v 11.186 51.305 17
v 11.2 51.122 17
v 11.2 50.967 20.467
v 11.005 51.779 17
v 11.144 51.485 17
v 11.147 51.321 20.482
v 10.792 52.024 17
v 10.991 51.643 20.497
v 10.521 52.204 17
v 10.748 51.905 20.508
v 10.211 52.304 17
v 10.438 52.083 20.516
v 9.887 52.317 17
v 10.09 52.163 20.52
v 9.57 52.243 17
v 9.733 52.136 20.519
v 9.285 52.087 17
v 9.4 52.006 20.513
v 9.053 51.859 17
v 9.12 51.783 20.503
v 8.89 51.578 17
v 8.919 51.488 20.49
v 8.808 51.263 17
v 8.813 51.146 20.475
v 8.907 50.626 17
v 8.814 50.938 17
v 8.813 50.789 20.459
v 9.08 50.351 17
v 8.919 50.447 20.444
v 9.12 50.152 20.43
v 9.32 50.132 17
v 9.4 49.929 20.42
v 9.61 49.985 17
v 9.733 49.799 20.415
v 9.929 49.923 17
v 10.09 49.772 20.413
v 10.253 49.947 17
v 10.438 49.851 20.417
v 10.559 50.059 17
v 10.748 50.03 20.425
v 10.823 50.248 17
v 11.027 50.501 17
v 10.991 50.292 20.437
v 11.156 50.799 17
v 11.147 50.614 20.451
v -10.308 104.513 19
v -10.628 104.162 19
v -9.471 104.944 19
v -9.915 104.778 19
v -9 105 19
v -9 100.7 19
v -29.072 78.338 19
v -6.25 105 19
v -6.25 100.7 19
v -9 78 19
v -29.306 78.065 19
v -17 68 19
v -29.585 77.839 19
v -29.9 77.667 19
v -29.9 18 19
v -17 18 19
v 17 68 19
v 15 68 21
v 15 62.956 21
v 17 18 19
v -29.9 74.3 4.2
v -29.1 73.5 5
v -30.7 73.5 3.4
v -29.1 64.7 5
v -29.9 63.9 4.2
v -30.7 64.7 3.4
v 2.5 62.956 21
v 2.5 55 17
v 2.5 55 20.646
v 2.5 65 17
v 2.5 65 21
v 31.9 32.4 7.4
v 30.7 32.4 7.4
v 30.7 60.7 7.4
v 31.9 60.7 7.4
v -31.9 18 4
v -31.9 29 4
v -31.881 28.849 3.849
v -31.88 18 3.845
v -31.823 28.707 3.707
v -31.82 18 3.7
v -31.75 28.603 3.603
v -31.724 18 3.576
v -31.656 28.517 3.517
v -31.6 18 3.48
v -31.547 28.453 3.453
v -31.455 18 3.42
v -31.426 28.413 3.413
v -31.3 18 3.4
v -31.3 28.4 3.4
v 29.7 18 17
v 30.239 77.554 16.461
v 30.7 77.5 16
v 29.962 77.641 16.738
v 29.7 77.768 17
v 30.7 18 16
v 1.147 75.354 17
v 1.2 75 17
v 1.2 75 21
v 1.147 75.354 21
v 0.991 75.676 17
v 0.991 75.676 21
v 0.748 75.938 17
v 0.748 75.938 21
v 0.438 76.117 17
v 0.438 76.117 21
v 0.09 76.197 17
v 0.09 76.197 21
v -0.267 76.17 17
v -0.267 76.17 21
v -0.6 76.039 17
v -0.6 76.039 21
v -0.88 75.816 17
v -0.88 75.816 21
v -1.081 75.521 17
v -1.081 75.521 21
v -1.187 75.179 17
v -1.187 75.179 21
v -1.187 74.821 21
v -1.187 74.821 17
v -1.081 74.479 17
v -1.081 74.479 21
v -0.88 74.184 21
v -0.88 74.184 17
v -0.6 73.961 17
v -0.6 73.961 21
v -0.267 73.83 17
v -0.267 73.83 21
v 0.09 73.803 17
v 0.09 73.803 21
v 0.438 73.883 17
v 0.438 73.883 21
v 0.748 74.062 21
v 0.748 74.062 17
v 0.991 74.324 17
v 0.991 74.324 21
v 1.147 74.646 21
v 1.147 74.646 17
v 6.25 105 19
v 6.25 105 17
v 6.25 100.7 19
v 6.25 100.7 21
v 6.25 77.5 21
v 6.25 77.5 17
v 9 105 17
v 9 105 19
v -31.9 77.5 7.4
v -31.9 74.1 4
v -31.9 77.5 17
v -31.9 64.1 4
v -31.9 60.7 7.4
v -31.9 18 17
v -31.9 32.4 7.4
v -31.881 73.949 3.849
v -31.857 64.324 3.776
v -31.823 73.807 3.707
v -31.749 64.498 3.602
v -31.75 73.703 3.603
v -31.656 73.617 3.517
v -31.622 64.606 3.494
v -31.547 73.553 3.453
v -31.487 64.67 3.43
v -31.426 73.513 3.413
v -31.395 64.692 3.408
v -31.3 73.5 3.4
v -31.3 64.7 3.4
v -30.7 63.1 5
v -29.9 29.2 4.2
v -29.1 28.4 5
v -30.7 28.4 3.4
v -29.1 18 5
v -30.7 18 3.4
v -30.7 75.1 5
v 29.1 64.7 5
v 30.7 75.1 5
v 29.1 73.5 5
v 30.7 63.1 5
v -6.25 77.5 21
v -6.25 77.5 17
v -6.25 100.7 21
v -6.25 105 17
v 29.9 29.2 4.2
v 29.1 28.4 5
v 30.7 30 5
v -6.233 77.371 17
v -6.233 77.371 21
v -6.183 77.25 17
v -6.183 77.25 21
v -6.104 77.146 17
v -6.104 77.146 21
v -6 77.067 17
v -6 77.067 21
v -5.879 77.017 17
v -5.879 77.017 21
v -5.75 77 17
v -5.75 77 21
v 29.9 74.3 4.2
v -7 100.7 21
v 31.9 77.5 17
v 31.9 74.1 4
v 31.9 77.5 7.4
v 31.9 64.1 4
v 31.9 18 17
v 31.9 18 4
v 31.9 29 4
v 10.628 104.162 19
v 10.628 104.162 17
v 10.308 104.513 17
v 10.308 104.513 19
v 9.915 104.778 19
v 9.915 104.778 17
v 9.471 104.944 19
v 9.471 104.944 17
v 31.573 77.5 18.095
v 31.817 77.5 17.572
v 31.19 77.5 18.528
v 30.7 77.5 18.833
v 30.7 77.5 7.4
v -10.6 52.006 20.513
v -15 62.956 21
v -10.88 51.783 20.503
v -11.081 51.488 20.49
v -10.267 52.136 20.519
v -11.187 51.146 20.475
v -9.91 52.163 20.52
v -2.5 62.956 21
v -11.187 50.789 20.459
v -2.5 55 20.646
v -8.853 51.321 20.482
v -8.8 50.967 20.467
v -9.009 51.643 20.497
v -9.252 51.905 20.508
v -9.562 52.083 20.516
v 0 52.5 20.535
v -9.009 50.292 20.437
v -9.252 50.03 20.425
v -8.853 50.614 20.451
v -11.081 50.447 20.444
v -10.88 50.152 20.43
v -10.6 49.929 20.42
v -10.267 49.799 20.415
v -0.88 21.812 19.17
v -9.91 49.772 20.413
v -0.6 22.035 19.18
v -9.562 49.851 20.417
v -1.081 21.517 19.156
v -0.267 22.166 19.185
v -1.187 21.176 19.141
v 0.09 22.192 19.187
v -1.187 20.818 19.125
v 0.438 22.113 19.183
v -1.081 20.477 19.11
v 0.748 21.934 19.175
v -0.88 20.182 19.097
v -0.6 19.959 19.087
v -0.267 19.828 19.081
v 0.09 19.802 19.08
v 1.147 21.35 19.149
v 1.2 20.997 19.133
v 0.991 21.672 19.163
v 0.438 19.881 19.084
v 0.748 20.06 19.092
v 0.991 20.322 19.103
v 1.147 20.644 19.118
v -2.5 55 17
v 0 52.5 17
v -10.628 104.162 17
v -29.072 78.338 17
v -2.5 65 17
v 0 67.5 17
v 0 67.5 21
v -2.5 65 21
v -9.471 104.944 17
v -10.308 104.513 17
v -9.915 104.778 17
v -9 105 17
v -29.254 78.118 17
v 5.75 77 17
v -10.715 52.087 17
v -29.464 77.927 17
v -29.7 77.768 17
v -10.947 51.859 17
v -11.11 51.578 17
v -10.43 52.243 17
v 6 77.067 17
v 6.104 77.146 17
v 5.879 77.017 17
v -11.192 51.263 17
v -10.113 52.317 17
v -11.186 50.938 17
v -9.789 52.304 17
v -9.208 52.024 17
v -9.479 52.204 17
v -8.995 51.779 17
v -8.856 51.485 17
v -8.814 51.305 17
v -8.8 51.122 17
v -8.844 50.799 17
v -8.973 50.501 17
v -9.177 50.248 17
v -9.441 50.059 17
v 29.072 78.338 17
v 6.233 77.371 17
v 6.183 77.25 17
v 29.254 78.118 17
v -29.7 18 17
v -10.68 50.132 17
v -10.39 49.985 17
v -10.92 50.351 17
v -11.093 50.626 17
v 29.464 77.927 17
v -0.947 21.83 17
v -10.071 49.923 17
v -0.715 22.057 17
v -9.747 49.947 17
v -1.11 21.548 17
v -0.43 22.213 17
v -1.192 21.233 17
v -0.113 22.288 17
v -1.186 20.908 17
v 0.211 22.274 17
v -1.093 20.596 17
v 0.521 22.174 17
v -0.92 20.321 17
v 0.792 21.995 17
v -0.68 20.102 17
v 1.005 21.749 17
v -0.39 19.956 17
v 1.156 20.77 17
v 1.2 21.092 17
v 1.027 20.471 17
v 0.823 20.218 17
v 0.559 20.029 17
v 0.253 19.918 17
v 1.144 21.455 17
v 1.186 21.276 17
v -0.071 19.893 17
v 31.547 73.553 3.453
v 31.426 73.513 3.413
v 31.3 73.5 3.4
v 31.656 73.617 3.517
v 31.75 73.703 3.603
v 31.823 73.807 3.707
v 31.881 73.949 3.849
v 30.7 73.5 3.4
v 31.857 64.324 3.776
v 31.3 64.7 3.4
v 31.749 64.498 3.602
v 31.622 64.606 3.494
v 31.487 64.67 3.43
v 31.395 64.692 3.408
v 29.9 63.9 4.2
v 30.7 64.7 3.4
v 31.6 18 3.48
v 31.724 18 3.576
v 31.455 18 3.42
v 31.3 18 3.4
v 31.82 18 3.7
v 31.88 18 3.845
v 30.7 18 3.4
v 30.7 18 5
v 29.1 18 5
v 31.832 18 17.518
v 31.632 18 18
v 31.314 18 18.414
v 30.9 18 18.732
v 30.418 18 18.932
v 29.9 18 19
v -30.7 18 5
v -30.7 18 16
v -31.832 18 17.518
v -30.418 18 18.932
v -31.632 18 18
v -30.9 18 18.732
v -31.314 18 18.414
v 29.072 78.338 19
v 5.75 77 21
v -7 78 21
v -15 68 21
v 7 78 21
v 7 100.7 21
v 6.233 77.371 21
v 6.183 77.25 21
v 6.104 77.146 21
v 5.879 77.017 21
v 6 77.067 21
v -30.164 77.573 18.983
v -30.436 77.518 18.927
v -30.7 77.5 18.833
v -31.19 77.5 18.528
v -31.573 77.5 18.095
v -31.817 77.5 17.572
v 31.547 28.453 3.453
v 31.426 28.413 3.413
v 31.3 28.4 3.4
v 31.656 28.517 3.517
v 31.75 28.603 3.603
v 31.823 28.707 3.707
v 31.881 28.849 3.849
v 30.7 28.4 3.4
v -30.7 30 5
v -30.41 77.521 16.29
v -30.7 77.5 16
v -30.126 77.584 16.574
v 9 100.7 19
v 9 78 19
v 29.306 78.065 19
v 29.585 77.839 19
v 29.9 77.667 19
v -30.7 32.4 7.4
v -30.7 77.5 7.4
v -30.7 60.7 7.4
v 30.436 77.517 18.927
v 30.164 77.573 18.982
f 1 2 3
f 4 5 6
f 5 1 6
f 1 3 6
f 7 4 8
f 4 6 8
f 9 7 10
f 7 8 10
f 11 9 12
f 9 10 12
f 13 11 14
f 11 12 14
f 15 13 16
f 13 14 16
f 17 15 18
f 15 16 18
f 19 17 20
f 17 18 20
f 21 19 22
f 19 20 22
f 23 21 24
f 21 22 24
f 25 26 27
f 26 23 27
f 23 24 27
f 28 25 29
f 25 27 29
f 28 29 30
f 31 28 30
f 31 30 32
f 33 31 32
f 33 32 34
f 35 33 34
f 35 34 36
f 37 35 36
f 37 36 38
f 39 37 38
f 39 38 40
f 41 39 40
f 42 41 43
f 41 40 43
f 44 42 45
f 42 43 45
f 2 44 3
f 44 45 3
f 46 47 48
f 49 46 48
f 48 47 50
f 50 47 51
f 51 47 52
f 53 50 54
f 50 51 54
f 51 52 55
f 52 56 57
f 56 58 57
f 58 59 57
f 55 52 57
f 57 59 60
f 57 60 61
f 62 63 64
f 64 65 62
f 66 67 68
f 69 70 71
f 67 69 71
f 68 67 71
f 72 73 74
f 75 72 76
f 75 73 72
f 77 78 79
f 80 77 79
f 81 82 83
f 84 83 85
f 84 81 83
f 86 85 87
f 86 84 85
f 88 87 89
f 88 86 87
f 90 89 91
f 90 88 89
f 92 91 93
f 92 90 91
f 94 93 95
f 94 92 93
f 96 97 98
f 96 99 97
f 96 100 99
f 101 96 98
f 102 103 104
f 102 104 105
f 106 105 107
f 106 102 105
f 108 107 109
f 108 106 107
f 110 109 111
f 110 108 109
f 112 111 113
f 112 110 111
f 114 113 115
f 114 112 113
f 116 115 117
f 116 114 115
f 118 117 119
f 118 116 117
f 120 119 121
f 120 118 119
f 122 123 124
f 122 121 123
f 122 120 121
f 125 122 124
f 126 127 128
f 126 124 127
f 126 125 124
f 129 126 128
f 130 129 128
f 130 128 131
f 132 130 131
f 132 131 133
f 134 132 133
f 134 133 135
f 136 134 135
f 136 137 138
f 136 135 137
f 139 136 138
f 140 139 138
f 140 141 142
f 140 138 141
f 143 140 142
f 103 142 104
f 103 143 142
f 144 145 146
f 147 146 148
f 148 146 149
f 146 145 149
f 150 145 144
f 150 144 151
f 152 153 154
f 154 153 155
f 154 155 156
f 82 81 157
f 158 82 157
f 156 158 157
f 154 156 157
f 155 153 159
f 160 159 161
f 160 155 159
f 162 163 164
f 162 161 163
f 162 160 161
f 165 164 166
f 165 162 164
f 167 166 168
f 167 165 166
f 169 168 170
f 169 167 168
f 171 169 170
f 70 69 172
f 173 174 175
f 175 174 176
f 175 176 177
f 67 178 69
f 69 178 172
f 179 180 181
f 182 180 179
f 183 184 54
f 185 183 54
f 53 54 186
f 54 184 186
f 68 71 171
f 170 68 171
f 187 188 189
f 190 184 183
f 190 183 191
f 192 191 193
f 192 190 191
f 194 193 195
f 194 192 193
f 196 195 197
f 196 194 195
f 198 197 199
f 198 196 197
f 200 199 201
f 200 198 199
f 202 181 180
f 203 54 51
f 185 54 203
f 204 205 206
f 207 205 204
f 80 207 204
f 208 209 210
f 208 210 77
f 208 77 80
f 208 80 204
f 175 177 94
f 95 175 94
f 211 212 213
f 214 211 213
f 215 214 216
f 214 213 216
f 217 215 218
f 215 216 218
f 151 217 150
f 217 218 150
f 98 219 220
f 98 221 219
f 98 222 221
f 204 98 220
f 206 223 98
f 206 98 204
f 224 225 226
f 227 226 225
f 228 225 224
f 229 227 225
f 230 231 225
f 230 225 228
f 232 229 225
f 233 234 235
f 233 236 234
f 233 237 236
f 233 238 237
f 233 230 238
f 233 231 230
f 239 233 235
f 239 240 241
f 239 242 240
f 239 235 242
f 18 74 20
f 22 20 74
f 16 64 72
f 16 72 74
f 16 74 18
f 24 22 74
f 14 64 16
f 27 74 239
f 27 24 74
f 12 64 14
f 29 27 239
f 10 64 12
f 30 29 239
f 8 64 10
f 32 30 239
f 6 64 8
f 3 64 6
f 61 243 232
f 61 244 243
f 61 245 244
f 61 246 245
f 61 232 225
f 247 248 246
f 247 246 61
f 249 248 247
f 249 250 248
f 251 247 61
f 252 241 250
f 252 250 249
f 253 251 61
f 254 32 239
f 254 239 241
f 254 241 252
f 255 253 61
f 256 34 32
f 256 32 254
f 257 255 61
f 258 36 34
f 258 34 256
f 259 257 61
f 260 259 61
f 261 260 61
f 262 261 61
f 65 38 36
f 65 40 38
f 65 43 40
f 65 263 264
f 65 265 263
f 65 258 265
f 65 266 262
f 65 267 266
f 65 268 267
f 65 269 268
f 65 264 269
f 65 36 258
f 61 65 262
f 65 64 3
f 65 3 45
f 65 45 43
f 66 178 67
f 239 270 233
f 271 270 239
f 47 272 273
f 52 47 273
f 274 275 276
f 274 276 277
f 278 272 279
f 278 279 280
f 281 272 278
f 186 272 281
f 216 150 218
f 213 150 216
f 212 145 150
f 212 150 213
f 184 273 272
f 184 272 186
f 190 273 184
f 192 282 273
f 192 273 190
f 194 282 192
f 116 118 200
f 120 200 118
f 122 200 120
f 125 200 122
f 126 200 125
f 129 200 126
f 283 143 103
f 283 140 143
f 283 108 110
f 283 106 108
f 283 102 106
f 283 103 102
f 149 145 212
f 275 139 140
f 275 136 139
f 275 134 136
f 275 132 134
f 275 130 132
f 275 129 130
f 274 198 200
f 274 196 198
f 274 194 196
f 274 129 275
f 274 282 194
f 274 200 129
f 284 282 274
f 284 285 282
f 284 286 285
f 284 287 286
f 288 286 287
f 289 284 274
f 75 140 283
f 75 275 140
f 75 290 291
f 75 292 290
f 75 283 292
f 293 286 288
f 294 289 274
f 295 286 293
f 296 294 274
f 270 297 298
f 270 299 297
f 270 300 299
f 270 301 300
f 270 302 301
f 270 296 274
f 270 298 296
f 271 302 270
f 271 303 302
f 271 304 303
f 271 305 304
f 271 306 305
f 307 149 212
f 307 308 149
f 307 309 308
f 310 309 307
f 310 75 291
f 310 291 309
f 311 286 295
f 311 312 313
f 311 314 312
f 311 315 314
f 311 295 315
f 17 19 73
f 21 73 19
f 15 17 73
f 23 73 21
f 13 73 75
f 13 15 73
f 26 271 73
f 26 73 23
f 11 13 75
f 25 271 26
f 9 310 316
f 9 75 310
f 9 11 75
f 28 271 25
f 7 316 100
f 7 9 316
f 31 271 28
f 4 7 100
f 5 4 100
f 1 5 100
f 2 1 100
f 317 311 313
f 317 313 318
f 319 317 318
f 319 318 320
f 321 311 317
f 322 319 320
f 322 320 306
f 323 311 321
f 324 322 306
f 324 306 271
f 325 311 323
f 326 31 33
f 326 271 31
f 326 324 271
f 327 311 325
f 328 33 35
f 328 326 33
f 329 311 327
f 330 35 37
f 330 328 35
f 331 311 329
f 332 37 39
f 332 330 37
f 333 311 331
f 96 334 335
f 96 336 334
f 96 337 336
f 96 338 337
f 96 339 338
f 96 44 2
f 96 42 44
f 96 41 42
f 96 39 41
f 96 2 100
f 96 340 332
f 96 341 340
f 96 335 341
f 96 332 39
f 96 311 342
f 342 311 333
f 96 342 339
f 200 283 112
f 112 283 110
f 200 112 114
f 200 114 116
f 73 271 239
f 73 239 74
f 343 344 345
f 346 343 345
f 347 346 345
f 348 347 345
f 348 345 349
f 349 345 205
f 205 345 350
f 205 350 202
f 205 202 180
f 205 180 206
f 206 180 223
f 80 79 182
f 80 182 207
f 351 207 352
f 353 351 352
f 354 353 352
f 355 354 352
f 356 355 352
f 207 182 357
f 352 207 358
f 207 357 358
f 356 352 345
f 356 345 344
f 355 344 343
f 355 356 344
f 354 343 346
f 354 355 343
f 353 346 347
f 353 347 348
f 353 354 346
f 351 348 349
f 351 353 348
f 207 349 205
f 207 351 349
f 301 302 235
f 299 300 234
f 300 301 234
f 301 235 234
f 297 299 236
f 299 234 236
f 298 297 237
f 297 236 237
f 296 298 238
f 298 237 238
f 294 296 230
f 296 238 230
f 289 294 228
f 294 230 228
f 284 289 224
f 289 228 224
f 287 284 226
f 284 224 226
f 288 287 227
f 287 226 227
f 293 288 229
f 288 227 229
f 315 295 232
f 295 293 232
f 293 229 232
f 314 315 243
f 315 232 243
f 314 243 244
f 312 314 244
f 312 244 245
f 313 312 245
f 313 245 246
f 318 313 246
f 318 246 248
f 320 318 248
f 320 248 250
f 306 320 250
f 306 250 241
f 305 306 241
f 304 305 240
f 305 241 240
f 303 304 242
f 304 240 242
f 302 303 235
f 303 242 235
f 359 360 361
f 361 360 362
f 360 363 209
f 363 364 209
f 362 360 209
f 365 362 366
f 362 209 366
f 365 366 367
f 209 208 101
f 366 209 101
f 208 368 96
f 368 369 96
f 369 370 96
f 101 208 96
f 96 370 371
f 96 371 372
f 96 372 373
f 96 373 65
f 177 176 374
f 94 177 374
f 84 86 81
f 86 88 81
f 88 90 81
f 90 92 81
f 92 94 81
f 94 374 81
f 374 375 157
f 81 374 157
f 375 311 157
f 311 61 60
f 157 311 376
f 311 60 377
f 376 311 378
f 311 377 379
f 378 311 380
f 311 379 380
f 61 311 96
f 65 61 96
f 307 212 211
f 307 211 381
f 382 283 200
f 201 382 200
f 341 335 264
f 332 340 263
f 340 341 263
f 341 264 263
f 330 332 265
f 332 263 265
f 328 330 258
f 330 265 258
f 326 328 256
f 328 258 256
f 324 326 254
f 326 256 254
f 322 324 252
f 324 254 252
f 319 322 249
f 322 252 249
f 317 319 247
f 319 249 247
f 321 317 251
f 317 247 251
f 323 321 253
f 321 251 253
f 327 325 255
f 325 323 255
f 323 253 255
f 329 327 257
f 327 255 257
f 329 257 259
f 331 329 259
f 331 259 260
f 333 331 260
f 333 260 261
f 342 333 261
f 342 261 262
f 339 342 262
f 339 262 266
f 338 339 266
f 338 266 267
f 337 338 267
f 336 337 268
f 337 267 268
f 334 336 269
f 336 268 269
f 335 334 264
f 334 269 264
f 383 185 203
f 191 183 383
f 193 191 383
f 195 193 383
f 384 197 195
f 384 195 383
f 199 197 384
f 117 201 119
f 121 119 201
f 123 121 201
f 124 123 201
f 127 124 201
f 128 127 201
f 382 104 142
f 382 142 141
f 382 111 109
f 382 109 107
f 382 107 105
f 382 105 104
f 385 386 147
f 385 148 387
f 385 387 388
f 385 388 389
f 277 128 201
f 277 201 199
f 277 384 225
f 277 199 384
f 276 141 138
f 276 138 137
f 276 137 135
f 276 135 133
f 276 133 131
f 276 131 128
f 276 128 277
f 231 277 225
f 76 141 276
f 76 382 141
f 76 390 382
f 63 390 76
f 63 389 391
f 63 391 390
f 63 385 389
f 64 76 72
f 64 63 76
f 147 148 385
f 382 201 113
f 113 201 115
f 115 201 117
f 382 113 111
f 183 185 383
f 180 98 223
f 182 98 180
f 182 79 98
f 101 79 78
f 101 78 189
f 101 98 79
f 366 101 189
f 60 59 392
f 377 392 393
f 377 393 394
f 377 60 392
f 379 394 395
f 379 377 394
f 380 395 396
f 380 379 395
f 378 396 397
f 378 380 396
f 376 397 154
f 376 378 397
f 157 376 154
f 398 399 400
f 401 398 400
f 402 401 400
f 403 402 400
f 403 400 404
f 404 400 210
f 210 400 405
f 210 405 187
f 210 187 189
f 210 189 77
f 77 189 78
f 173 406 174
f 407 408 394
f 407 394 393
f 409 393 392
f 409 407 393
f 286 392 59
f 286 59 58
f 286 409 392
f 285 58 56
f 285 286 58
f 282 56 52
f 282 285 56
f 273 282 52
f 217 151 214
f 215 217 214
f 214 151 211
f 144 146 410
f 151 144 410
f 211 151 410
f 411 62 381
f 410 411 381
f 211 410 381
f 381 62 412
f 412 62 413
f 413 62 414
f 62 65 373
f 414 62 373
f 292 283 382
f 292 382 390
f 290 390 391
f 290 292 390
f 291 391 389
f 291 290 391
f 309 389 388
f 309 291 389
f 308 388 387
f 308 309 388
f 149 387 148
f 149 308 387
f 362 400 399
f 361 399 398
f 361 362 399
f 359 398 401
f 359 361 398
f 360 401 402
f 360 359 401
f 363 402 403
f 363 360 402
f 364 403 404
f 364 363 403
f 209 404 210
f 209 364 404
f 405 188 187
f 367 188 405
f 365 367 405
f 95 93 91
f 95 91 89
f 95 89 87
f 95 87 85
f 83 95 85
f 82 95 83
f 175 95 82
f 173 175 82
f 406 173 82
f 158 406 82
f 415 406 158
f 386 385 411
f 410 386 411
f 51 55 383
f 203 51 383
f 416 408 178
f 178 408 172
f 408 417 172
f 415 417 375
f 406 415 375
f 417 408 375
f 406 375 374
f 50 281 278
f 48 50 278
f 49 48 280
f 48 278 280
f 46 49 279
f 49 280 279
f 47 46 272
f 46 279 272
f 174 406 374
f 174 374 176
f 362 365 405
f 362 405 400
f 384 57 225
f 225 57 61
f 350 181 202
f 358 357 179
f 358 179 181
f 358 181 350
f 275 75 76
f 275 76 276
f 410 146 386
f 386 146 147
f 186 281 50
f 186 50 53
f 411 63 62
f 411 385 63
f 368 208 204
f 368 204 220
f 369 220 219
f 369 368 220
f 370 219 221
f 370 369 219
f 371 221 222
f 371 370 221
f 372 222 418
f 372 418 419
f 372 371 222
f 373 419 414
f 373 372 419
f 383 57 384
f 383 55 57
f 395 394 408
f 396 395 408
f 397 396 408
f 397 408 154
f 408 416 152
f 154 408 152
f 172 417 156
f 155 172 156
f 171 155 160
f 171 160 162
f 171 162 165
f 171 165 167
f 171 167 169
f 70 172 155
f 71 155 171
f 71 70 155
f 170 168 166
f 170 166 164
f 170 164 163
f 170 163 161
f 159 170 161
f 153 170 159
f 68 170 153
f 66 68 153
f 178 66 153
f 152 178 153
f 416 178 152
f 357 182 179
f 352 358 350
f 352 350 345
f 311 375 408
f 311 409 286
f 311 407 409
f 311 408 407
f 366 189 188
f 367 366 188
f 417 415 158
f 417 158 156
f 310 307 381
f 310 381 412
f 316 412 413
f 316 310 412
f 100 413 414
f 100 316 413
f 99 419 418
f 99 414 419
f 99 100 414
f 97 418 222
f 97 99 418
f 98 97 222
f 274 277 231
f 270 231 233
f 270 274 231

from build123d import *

# Parameters (mm, degrees)
PAD002_DEPTH         = 119
PAD003_DEPTH         = 17
POCKET015_DEPTH      = 119.001
SKETCH040_R          = 1.2
POCKET016_DEPTH      = 20.8744738654
POCKET017_DEPTH      = 16.001
POCKET018_DEPTH      = 16.001
POCKET018_DEPTH_BACK = 1.601
SKETCH044_R          = 1.2
POCKET019_DEPTH      = 1.601
POCKET019_DEPTH_BACK = 16.001
POCKET020_DEPTH      = 27.001
SKETCH048_W          = 4.3
SKETCH048_H          = 2
POCKET021_DEPTH      = 31.9010001
POCKET021_DEPTH_BACK = 31.9010001
POCKET023_DEPTH      = 31.9010001
POCKET023_DEPTH_BACK = 31.9010001
POCKET024_DEPTH      = 1.601


with BuildPart() as part:
    # Sketch033 → Pad002 (new body)
    with BuildSketch(Plane.XZ):
        with BuildLine():
            Line((-30.7, 11), (-30.7, 0))
            Line((-30.7, 0), (-29.1, 0))
            Line((-29.1, 0), (-30.7, -1.6))
            Line((-30.7, -1.6), (-31.3, -1.6))
            ThreePointArc((-31.9, -1), (-31.7242640687, -1.4242640687), (-31.3, -1.6))
            Line((-31.9, -1), (-31.9, 12))
            ThreePointArc((-29.9, 14), (-31.3142135624, 13.4142135624), (-31.9, 12))
            Line((-29.9, 14), (29.9, 14))
            ThreePointArc((31.9, 12), (31.3142135624, 13.4142135624), (29.9, 14))
            Line((31.9, -1), (31.9, 12))
            ThreePointArc((31.3, -1.6), (31.7242640687, -1.4242640687), (31.9, -1))
            Line((30.7, -1.6), (31.3, -1.6))
            Line((29.1, 0), (30.7, -1.6))
            Line((30.7, 0), (29.1, 0))
            Line((30.7, 11), (30.7, 0))
            Line((29.7, 12), (30.7, 11))
            Line((-29.7, 12), (29.7, 12))
            Line((-30.7, 11), (-29.7, 12))
        make_face()
    extrude(amount=-PAD002_DEPTH)

    # Sketch034 → Pad003 (join, symmetric)
    with BuildSketch(Plane.YZ):
        Polygon((0, 14), (119, 14), (119, 16), (44.955533586, 16), align=None)
    extrude(amount=PAD003_DEPTH, both=True)

    # Sketch039 → Pocket015 (cut, through all)
    with BuildSketch(Plane.XZ):
        Polygon((-17, 14), (-15, 16), (15, 16), (17, 14), (31.9, 14), (31.9, 26), (-31.9, 26), (-31.9, 14), align=None)
    extrude(amount=-POCKET015_DEPTH, mode=Mode.SUBTRACT)

    # Sketch040 (on DatumPlane) → Pocket016 (cut, through all)
    with BuildSketch(Plane(origin=(0, 0, 14), x_dir=(1, 0, 0), z_dir=(0, -0.0444444444, 0.9990118575))):
        with Locations((-10, 33)):
            Circle(SKETCH040_R)
        with Locations((10, 33)):
            Circle(SKETCH040_R)
        with Locations((0, 3)):
            Circle(SKETCH040_R)
    extrude(amount=-POCKET016_DEPTH, mode=Mode.SUBTRACT)

    # Sketch041 → Pocket017 (cut, through all)
    with BuildSketch(Plane.XY):
        Polygon((0, 49.5), (-2.5, 47), (-2.5, 37), (0, 34.5), (2.5, 37), (2.5, 47), align=None)
    extrude(amount=POCKET017_DEPTH, mode=Mode.SUBTRACT)

    # Sketch043 → Pocket018 (cut, two sides)
    with BuildSketch(Plane.XY) as pocket018_sk:
        with BuildLine():
            Line((-9, 87), (9, 87))
            ThreePointArc((10.6275065469, 86.1624209391), (9.9151934555, 86.7783196954), (9, 87))
            Line((10.6275065469, 86.1624209391), (29.0724934531, 60.3375790609))
            ThreePointArc((29.0724934531, 60.3375790609), (29.7848065445, 59.7216803046), (30.7, 59.5))
            Line((30.7, 59.5), (61.4, 59.5))
            Line((61.4, 119), (61.4, 59.5))
            Line((-61.4, 119), (61.4, 119))
            Line((-61.4, 59.5), (-61.4, 119))
            Line((-30.7, 59.5), (-61.4, 59.5))
            ThreePointArc((-30.7, 59.5), (-29.7848065445, 59.7216803046), (-29.0724934531, 60.3375790609))
            Line((-10.6275065469, 86.1624209391), (-29.0724934531, 60.3375790609))
            ThreePointArc((-9, 87), (-9.9151934555, 86.7783196954), (-10.6275065469, 86.1624209391))
        make_face()
    extrude(amount=POCKET018_DEPTH, mode=Mode.SUBTRACT)
    extrude(pocket018_sk.sketch, amount=-POCKET018_DEPTH_BACK, mode=Mode.SUBTRACT)

    # Sketch044 → Pocket019 (cut, two sides)
    with BuildSketch(Plane.XY) as pocket019_sk:
        with Locations((0, 57)):
            Circle(SKETCH044_R)
        with BuildLine():
            Line((-6.25, 119), (6.25, 119))
            Line((6.25, 119), (6.25, 59.5))
            ThreePointArc((5.75, 59), (6.1035533906, 59.1464466094), (6.25, 59.5))
            Line((5.75, 59), (-5.75, 59))
            ThreePointArc((-6.25, 59.5), (-6.1035533906, 59.1464466094), (-5.75, 59))
            Line((-6.25, 59.5), (-6.25, 119))
        make_face()
    extrude(amount=-POCKET019_DEPTH, mode=Mode.SUBTRACT)
    extrude(pocket019_sk.sketch, amount=POCKET019_DEPTH_BACK, mode=Mode.SUBTRACT)

    # Sketch045 (on DatumPlane) → SubtractiveLoft001 section 0
    with BuildSketch(Plane.XZ.offset(-50)):
        Polygon((-17, 14), (-15, 16), (15, 16), (17, 14), (31.9, 14), (31.9, 26), (-31.9, 26), (-31.9, 14), align=None)
    # Sketch046 (on DatumPlane) → SubtractiveLoft001 section 1
    with BuildSketch(Plane.XZ.offset(-60)):
        Polygon((-9, 14), (-7, 16), (7, 16), (9, 14), (31.9, 14), (31.9, 26), (-31.9, 26), (-31.9, 14), align=None)
    loft(mode=Mode.SUBTRACT)

    # Sketch047 (on DatumPlane) → Pocket020 (cut, through all)
    with BuildSketch(Plane.XZ.offset(-60)):
        Polygon((-9, 14), (-7, 16), (7, 16), (9, 14), (31.9, 14), (31.9, 26), (-31.9, 26), (-31.9, 14), align=None)
    extrude(amount=-POCKET020_DEPTH, mode=Mode.SUBTRACT)

    # Sketch048 → Pocket021 (cut, two sides)
    with BuildSketch(Plane.YZ) as pocket021_sk:
        with Locations((84.85, 15)):
            Rectangle(SKETCH048_W, SKETCH048_H)
    extrude(amount=-POCKET021_DEPTH, mode=Mode.SUBTRACT)
    extrude(pocket021_sk.sketch, amount=POCKET021_DEPTH_BACK, mode=Mode.SUBTRACT)

    # Sketch051 → Pocket023 (cut, two sides)
    with BuildSketch(Plane.YZ) as pocket023_sk:
        Polygon((0, -1.6), (10.4, -1.6), (14.4, 2.4), (42.7, 2.4), (46.7, -1.6), (55.5, -1.6), (59.5, 2.4), (63.5, 2.4), (63.5, -13.6), (0, -13.6), align=None)
    extrude(amount=-POCKET023_DEPTH, mode=Mode.SUBTRACT)
    extrude(pocket023_sk.sketch, amount=POCKET023_DEPTH_BACK, mode=Mode.SUBTRACT)

    # Sketch052 → Pocket024 (cut, through all)
    with BuildSketch(Plane.XY):
        Polygon((-29.1, 10.4), (29.1, 10.4), (30.7, 12), (30.7, 45.1), (29.1, 46.7), (29.1, 55.5), (30.7, 57.1), (30.7, 69.1), (-30.7, 69.1), (-30.7, 57.1), (-29.1, 55.5), (-29.1, 46.7), (-30.7, 45.1), (-30.7, 12), align=None)
    extrude(amount=-POCKET024_DEPTH, mode=Mode.SUBTRACT)


with BuildPart() as part_1:
    # Body002 placement: moved
    add(part.part.moved(Location((0, 18, 5))))


solid = part_1.part
